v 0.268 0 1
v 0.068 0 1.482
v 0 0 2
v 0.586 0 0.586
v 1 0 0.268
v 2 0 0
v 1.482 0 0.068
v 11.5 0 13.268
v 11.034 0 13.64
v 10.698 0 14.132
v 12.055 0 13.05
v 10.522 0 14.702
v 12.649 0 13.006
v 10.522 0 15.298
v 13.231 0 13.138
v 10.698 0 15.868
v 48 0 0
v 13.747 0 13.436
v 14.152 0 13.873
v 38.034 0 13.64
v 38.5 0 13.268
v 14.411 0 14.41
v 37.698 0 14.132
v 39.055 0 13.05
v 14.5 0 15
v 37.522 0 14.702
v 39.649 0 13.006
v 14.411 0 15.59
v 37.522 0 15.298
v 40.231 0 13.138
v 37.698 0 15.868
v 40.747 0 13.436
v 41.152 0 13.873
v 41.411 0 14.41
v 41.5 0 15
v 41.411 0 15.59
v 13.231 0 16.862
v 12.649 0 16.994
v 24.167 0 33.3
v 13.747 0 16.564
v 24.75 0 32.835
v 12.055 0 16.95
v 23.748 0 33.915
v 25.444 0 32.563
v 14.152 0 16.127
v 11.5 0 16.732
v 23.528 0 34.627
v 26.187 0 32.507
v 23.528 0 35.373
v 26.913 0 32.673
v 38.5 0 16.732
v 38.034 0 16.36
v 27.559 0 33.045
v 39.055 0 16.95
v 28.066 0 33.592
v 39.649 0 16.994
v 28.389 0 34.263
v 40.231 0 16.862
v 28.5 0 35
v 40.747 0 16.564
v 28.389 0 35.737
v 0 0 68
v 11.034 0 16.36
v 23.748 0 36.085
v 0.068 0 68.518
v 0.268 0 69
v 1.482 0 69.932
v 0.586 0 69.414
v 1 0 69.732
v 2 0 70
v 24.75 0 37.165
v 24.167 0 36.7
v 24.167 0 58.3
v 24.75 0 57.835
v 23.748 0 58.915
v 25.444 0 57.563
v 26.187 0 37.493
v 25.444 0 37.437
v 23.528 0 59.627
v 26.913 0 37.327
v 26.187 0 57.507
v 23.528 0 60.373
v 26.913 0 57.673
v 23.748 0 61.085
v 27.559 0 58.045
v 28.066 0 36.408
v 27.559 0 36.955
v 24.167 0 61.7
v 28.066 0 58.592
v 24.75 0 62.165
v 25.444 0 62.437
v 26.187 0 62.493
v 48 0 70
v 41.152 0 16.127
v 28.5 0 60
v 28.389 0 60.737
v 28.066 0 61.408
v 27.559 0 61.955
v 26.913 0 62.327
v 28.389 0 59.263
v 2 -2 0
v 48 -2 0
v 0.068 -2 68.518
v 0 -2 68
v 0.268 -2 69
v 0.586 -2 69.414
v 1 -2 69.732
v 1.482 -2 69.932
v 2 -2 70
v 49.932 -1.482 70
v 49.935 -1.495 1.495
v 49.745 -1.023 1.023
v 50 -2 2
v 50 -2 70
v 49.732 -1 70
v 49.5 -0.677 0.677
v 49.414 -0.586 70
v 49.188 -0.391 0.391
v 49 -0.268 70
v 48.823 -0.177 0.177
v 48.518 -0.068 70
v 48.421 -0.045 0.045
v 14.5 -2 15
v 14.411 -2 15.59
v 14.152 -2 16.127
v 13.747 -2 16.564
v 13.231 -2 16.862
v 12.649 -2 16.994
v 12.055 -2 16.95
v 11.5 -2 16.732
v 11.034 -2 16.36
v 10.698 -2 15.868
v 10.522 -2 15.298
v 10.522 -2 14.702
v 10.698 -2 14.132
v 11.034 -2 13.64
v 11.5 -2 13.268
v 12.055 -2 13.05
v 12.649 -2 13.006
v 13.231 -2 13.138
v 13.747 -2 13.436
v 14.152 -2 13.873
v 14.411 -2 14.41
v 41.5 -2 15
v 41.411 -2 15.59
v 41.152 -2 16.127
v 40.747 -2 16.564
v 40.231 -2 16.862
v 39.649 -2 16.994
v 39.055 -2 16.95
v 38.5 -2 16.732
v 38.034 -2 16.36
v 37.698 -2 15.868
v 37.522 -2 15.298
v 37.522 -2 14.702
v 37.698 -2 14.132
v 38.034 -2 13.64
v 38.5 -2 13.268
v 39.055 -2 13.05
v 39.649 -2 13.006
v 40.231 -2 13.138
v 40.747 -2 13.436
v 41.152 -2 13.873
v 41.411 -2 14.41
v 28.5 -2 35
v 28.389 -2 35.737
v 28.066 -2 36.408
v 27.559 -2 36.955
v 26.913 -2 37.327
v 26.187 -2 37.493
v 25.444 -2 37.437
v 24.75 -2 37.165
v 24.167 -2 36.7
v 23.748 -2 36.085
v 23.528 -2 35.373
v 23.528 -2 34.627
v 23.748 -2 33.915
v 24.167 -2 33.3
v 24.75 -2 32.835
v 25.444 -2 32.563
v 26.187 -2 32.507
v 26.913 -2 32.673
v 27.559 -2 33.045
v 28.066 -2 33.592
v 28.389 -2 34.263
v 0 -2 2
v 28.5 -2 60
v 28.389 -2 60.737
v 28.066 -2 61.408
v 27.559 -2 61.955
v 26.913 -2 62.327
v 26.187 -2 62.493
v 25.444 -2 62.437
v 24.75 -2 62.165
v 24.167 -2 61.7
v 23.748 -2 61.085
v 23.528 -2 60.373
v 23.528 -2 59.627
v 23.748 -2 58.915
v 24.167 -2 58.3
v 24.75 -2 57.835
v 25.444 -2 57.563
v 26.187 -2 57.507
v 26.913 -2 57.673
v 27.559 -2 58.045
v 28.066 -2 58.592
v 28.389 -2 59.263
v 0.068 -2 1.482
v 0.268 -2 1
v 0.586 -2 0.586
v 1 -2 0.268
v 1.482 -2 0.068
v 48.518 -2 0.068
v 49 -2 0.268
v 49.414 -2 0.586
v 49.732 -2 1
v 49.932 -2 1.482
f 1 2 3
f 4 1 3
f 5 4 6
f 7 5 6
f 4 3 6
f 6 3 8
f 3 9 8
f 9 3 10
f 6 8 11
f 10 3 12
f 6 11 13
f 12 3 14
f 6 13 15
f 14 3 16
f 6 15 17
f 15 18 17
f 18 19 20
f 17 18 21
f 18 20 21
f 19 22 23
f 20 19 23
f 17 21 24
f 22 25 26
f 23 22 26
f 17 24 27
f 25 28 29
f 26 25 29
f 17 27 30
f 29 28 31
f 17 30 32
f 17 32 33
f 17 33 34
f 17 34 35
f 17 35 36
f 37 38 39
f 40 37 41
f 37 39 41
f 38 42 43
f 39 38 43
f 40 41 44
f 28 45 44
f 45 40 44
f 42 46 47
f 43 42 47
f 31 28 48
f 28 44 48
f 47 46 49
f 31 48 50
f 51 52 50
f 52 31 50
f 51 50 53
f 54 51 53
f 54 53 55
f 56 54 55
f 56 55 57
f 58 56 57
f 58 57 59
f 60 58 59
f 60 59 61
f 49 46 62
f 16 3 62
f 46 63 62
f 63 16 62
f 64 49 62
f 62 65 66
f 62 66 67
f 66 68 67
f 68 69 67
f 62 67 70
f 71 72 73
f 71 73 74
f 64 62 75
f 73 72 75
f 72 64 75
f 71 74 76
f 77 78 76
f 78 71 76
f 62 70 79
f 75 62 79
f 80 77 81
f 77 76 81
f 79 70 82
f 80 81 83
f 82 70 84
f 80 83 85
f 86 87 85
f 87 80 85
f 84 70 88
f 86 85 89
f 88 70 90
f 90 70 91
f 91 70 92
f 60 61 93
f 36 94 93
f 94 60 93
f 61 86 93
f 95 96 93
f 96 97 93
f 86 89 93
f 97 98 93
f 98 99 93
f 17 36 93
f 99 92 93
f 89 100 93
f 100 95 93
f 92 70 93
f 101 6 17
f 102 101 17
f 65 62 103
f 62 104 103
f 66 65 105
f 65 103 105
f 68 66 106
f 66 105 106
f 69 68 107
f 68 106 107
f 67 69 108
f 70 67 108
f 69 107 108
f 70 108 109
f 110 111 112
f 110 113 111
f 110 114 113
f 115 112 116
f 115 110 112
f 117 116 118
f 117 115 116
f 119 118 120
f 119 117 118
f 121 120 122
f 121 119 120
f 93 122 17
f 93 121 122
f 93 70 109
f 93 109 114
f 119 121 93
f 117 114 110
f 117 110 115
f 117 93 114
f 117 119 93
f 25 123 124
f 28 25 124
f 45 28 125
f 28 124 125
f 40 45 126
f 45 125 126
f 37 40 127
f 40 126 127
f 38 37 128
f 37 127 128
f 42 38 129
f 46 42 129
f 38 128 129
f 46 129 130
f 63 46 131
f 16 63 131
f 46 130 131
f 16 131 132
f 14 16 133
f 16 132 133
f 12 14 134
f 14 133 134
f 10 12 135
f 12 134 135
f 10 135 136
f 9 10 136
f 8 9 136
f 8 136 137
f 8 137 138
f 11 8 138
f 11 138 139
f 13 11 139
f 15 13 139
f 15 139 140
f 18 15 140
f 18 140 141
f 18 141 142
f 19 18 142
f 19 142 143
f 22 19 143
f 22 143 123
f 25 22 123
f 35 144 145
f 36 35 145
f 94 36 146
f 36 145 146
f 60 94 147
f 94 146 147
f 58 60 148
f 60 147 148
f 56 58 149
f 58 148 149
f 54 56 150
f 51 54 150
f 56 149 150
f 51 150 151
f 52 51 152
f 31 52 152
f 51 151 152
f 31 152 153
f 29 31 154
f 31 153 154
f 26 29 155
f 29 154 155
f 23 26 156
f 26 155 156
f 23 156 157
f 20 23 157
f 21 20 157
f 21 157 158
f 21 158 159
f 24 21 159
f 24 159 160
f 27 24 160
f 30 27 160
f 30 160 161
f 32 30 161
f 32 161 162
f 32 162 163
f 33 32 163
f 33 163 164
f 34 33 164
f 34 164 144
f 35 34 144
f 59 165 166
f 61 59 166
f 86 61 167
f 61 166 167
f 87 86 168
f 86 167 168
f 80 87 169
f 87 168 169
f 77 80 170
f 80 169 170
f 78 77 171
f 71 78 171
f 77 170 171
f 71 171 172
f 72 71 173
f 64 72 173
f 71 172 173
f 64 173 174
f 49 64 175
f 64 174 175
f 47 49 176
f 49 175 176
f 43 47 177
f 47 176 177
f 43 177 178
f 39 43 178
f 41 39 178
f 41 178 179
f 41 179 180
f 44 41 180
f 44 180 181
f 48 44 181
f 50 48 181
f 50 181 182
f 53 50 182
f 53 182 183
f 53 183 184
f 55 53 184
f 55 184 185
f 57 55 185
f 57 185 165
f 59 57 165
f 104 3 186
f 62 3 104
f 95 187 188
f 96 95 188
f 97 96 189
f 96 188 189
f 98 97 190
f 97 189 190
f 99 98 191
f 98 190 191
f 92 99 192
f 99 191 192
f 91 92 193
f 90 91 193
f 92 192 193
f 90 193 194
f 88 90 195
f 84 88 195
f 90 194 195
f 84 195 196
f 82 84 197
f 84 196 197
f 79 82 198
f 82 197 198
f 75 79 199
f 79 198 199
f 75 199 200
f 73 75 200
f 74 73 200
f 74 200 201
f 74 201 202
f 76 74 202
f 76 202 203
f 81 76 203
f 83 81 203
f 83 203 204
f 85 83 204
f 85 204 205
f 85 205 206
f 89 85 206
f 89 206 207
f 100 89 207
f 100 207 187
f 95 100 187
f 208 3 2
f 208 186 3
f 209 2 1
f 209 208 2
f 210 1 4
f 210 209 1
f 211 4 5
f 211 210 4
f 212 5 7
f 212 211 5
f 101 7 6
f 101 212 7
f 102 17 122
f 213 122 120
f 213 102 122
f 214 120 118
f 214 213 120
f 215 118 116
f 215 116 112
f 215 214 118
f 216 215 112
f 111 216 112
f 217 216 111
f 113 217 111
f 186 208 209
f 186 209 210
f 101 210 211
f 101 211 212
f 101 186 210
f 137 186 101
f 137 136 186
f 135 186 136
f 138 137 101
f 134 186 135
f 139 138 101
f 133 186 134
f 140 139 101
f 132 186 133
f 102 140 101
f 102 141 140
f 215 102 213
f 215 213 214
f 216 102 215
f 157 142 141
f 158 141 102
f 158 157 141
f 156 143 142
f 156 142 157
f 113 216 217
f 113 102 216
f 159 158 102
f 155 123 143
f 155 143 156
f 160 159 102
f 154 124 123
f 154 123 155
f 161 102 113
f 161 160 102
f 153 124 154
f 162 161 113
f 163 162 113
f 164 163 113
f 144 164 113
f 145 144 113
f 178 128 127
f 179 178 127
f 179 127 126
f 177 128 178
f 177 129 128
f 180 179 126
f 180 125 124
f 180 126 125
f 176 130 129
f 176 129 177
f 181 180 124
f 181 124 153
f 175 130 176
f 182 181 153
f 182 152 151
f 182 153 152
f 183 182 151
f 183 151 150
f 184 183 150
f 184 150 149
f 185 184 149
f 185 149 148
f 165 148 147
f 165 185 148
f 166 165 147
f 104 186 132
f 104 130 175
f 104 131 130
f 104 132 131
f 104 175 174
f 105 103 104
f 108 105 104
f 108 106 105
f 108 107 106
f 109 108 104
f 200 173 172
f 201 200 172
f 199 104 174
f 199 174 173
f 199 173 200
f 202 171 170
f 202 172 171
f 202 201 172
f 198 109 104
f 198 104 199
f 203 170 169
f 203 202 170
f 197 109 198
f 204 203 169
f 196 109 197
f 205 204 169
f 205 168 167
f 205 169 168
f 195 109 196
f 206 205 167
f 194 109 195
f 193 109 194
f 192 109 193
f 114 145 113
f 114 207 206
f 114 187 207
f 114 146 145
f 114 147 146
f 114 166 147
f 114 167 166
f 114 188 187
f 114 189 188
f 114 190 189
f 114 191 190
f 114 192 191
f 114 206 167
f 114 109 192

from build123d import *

# Parameters (mm, degrees)
F0_W     = 50
F0_H     = 70
F1_DEPTH = 2
F2_R     = 1.99999
F3_R     = 2
F3_R_2   = 2.5
F4_DEPTH = 2.001


# Not quite as in the source:
# - a fillet or chamfer is up to 0.001 mm smaller than in the source, because OpenCascade refuses the exact size


with BuildPart() as f1:
    # F0 (on Front) → F1 (new body)
    with BuildSketch(Plane.XZ):
        with Locations((25, 35)):
            Rectangle(F0_W, F0_H)
    extrude(amount=F1_DEPTH)

    # F2 (radius 2 in the source; OpenCascade refuses exactly that, so slightly less here)
    f2_edges = [f1.edges().sort_by_distance(p)[0] for p in [
        (0, -1, 0),
        (50, -1, 0),
        (50, 0, 35),
        (0, -1, 70),
    ]]
    fillet(f2_edges, radius=F2_R)

    # F3 (on face) → F4 (cut, through all)
    with BuildSketch(Plane.XZ.offset(2)):
        with Locations((12.5, 15)):
            Circle(F3_R)
        with Locations((39.5, 15)):
            Circle(F3_R)
        with Locations((26, 60)):
            Circle(F3_R_2)
        with Locations((26, 35)):
            Circle(F3_R_2)
    extrude(amount=-F4_DEPTH, mode=Mode.SUBTRACT)


solid = f1.part
